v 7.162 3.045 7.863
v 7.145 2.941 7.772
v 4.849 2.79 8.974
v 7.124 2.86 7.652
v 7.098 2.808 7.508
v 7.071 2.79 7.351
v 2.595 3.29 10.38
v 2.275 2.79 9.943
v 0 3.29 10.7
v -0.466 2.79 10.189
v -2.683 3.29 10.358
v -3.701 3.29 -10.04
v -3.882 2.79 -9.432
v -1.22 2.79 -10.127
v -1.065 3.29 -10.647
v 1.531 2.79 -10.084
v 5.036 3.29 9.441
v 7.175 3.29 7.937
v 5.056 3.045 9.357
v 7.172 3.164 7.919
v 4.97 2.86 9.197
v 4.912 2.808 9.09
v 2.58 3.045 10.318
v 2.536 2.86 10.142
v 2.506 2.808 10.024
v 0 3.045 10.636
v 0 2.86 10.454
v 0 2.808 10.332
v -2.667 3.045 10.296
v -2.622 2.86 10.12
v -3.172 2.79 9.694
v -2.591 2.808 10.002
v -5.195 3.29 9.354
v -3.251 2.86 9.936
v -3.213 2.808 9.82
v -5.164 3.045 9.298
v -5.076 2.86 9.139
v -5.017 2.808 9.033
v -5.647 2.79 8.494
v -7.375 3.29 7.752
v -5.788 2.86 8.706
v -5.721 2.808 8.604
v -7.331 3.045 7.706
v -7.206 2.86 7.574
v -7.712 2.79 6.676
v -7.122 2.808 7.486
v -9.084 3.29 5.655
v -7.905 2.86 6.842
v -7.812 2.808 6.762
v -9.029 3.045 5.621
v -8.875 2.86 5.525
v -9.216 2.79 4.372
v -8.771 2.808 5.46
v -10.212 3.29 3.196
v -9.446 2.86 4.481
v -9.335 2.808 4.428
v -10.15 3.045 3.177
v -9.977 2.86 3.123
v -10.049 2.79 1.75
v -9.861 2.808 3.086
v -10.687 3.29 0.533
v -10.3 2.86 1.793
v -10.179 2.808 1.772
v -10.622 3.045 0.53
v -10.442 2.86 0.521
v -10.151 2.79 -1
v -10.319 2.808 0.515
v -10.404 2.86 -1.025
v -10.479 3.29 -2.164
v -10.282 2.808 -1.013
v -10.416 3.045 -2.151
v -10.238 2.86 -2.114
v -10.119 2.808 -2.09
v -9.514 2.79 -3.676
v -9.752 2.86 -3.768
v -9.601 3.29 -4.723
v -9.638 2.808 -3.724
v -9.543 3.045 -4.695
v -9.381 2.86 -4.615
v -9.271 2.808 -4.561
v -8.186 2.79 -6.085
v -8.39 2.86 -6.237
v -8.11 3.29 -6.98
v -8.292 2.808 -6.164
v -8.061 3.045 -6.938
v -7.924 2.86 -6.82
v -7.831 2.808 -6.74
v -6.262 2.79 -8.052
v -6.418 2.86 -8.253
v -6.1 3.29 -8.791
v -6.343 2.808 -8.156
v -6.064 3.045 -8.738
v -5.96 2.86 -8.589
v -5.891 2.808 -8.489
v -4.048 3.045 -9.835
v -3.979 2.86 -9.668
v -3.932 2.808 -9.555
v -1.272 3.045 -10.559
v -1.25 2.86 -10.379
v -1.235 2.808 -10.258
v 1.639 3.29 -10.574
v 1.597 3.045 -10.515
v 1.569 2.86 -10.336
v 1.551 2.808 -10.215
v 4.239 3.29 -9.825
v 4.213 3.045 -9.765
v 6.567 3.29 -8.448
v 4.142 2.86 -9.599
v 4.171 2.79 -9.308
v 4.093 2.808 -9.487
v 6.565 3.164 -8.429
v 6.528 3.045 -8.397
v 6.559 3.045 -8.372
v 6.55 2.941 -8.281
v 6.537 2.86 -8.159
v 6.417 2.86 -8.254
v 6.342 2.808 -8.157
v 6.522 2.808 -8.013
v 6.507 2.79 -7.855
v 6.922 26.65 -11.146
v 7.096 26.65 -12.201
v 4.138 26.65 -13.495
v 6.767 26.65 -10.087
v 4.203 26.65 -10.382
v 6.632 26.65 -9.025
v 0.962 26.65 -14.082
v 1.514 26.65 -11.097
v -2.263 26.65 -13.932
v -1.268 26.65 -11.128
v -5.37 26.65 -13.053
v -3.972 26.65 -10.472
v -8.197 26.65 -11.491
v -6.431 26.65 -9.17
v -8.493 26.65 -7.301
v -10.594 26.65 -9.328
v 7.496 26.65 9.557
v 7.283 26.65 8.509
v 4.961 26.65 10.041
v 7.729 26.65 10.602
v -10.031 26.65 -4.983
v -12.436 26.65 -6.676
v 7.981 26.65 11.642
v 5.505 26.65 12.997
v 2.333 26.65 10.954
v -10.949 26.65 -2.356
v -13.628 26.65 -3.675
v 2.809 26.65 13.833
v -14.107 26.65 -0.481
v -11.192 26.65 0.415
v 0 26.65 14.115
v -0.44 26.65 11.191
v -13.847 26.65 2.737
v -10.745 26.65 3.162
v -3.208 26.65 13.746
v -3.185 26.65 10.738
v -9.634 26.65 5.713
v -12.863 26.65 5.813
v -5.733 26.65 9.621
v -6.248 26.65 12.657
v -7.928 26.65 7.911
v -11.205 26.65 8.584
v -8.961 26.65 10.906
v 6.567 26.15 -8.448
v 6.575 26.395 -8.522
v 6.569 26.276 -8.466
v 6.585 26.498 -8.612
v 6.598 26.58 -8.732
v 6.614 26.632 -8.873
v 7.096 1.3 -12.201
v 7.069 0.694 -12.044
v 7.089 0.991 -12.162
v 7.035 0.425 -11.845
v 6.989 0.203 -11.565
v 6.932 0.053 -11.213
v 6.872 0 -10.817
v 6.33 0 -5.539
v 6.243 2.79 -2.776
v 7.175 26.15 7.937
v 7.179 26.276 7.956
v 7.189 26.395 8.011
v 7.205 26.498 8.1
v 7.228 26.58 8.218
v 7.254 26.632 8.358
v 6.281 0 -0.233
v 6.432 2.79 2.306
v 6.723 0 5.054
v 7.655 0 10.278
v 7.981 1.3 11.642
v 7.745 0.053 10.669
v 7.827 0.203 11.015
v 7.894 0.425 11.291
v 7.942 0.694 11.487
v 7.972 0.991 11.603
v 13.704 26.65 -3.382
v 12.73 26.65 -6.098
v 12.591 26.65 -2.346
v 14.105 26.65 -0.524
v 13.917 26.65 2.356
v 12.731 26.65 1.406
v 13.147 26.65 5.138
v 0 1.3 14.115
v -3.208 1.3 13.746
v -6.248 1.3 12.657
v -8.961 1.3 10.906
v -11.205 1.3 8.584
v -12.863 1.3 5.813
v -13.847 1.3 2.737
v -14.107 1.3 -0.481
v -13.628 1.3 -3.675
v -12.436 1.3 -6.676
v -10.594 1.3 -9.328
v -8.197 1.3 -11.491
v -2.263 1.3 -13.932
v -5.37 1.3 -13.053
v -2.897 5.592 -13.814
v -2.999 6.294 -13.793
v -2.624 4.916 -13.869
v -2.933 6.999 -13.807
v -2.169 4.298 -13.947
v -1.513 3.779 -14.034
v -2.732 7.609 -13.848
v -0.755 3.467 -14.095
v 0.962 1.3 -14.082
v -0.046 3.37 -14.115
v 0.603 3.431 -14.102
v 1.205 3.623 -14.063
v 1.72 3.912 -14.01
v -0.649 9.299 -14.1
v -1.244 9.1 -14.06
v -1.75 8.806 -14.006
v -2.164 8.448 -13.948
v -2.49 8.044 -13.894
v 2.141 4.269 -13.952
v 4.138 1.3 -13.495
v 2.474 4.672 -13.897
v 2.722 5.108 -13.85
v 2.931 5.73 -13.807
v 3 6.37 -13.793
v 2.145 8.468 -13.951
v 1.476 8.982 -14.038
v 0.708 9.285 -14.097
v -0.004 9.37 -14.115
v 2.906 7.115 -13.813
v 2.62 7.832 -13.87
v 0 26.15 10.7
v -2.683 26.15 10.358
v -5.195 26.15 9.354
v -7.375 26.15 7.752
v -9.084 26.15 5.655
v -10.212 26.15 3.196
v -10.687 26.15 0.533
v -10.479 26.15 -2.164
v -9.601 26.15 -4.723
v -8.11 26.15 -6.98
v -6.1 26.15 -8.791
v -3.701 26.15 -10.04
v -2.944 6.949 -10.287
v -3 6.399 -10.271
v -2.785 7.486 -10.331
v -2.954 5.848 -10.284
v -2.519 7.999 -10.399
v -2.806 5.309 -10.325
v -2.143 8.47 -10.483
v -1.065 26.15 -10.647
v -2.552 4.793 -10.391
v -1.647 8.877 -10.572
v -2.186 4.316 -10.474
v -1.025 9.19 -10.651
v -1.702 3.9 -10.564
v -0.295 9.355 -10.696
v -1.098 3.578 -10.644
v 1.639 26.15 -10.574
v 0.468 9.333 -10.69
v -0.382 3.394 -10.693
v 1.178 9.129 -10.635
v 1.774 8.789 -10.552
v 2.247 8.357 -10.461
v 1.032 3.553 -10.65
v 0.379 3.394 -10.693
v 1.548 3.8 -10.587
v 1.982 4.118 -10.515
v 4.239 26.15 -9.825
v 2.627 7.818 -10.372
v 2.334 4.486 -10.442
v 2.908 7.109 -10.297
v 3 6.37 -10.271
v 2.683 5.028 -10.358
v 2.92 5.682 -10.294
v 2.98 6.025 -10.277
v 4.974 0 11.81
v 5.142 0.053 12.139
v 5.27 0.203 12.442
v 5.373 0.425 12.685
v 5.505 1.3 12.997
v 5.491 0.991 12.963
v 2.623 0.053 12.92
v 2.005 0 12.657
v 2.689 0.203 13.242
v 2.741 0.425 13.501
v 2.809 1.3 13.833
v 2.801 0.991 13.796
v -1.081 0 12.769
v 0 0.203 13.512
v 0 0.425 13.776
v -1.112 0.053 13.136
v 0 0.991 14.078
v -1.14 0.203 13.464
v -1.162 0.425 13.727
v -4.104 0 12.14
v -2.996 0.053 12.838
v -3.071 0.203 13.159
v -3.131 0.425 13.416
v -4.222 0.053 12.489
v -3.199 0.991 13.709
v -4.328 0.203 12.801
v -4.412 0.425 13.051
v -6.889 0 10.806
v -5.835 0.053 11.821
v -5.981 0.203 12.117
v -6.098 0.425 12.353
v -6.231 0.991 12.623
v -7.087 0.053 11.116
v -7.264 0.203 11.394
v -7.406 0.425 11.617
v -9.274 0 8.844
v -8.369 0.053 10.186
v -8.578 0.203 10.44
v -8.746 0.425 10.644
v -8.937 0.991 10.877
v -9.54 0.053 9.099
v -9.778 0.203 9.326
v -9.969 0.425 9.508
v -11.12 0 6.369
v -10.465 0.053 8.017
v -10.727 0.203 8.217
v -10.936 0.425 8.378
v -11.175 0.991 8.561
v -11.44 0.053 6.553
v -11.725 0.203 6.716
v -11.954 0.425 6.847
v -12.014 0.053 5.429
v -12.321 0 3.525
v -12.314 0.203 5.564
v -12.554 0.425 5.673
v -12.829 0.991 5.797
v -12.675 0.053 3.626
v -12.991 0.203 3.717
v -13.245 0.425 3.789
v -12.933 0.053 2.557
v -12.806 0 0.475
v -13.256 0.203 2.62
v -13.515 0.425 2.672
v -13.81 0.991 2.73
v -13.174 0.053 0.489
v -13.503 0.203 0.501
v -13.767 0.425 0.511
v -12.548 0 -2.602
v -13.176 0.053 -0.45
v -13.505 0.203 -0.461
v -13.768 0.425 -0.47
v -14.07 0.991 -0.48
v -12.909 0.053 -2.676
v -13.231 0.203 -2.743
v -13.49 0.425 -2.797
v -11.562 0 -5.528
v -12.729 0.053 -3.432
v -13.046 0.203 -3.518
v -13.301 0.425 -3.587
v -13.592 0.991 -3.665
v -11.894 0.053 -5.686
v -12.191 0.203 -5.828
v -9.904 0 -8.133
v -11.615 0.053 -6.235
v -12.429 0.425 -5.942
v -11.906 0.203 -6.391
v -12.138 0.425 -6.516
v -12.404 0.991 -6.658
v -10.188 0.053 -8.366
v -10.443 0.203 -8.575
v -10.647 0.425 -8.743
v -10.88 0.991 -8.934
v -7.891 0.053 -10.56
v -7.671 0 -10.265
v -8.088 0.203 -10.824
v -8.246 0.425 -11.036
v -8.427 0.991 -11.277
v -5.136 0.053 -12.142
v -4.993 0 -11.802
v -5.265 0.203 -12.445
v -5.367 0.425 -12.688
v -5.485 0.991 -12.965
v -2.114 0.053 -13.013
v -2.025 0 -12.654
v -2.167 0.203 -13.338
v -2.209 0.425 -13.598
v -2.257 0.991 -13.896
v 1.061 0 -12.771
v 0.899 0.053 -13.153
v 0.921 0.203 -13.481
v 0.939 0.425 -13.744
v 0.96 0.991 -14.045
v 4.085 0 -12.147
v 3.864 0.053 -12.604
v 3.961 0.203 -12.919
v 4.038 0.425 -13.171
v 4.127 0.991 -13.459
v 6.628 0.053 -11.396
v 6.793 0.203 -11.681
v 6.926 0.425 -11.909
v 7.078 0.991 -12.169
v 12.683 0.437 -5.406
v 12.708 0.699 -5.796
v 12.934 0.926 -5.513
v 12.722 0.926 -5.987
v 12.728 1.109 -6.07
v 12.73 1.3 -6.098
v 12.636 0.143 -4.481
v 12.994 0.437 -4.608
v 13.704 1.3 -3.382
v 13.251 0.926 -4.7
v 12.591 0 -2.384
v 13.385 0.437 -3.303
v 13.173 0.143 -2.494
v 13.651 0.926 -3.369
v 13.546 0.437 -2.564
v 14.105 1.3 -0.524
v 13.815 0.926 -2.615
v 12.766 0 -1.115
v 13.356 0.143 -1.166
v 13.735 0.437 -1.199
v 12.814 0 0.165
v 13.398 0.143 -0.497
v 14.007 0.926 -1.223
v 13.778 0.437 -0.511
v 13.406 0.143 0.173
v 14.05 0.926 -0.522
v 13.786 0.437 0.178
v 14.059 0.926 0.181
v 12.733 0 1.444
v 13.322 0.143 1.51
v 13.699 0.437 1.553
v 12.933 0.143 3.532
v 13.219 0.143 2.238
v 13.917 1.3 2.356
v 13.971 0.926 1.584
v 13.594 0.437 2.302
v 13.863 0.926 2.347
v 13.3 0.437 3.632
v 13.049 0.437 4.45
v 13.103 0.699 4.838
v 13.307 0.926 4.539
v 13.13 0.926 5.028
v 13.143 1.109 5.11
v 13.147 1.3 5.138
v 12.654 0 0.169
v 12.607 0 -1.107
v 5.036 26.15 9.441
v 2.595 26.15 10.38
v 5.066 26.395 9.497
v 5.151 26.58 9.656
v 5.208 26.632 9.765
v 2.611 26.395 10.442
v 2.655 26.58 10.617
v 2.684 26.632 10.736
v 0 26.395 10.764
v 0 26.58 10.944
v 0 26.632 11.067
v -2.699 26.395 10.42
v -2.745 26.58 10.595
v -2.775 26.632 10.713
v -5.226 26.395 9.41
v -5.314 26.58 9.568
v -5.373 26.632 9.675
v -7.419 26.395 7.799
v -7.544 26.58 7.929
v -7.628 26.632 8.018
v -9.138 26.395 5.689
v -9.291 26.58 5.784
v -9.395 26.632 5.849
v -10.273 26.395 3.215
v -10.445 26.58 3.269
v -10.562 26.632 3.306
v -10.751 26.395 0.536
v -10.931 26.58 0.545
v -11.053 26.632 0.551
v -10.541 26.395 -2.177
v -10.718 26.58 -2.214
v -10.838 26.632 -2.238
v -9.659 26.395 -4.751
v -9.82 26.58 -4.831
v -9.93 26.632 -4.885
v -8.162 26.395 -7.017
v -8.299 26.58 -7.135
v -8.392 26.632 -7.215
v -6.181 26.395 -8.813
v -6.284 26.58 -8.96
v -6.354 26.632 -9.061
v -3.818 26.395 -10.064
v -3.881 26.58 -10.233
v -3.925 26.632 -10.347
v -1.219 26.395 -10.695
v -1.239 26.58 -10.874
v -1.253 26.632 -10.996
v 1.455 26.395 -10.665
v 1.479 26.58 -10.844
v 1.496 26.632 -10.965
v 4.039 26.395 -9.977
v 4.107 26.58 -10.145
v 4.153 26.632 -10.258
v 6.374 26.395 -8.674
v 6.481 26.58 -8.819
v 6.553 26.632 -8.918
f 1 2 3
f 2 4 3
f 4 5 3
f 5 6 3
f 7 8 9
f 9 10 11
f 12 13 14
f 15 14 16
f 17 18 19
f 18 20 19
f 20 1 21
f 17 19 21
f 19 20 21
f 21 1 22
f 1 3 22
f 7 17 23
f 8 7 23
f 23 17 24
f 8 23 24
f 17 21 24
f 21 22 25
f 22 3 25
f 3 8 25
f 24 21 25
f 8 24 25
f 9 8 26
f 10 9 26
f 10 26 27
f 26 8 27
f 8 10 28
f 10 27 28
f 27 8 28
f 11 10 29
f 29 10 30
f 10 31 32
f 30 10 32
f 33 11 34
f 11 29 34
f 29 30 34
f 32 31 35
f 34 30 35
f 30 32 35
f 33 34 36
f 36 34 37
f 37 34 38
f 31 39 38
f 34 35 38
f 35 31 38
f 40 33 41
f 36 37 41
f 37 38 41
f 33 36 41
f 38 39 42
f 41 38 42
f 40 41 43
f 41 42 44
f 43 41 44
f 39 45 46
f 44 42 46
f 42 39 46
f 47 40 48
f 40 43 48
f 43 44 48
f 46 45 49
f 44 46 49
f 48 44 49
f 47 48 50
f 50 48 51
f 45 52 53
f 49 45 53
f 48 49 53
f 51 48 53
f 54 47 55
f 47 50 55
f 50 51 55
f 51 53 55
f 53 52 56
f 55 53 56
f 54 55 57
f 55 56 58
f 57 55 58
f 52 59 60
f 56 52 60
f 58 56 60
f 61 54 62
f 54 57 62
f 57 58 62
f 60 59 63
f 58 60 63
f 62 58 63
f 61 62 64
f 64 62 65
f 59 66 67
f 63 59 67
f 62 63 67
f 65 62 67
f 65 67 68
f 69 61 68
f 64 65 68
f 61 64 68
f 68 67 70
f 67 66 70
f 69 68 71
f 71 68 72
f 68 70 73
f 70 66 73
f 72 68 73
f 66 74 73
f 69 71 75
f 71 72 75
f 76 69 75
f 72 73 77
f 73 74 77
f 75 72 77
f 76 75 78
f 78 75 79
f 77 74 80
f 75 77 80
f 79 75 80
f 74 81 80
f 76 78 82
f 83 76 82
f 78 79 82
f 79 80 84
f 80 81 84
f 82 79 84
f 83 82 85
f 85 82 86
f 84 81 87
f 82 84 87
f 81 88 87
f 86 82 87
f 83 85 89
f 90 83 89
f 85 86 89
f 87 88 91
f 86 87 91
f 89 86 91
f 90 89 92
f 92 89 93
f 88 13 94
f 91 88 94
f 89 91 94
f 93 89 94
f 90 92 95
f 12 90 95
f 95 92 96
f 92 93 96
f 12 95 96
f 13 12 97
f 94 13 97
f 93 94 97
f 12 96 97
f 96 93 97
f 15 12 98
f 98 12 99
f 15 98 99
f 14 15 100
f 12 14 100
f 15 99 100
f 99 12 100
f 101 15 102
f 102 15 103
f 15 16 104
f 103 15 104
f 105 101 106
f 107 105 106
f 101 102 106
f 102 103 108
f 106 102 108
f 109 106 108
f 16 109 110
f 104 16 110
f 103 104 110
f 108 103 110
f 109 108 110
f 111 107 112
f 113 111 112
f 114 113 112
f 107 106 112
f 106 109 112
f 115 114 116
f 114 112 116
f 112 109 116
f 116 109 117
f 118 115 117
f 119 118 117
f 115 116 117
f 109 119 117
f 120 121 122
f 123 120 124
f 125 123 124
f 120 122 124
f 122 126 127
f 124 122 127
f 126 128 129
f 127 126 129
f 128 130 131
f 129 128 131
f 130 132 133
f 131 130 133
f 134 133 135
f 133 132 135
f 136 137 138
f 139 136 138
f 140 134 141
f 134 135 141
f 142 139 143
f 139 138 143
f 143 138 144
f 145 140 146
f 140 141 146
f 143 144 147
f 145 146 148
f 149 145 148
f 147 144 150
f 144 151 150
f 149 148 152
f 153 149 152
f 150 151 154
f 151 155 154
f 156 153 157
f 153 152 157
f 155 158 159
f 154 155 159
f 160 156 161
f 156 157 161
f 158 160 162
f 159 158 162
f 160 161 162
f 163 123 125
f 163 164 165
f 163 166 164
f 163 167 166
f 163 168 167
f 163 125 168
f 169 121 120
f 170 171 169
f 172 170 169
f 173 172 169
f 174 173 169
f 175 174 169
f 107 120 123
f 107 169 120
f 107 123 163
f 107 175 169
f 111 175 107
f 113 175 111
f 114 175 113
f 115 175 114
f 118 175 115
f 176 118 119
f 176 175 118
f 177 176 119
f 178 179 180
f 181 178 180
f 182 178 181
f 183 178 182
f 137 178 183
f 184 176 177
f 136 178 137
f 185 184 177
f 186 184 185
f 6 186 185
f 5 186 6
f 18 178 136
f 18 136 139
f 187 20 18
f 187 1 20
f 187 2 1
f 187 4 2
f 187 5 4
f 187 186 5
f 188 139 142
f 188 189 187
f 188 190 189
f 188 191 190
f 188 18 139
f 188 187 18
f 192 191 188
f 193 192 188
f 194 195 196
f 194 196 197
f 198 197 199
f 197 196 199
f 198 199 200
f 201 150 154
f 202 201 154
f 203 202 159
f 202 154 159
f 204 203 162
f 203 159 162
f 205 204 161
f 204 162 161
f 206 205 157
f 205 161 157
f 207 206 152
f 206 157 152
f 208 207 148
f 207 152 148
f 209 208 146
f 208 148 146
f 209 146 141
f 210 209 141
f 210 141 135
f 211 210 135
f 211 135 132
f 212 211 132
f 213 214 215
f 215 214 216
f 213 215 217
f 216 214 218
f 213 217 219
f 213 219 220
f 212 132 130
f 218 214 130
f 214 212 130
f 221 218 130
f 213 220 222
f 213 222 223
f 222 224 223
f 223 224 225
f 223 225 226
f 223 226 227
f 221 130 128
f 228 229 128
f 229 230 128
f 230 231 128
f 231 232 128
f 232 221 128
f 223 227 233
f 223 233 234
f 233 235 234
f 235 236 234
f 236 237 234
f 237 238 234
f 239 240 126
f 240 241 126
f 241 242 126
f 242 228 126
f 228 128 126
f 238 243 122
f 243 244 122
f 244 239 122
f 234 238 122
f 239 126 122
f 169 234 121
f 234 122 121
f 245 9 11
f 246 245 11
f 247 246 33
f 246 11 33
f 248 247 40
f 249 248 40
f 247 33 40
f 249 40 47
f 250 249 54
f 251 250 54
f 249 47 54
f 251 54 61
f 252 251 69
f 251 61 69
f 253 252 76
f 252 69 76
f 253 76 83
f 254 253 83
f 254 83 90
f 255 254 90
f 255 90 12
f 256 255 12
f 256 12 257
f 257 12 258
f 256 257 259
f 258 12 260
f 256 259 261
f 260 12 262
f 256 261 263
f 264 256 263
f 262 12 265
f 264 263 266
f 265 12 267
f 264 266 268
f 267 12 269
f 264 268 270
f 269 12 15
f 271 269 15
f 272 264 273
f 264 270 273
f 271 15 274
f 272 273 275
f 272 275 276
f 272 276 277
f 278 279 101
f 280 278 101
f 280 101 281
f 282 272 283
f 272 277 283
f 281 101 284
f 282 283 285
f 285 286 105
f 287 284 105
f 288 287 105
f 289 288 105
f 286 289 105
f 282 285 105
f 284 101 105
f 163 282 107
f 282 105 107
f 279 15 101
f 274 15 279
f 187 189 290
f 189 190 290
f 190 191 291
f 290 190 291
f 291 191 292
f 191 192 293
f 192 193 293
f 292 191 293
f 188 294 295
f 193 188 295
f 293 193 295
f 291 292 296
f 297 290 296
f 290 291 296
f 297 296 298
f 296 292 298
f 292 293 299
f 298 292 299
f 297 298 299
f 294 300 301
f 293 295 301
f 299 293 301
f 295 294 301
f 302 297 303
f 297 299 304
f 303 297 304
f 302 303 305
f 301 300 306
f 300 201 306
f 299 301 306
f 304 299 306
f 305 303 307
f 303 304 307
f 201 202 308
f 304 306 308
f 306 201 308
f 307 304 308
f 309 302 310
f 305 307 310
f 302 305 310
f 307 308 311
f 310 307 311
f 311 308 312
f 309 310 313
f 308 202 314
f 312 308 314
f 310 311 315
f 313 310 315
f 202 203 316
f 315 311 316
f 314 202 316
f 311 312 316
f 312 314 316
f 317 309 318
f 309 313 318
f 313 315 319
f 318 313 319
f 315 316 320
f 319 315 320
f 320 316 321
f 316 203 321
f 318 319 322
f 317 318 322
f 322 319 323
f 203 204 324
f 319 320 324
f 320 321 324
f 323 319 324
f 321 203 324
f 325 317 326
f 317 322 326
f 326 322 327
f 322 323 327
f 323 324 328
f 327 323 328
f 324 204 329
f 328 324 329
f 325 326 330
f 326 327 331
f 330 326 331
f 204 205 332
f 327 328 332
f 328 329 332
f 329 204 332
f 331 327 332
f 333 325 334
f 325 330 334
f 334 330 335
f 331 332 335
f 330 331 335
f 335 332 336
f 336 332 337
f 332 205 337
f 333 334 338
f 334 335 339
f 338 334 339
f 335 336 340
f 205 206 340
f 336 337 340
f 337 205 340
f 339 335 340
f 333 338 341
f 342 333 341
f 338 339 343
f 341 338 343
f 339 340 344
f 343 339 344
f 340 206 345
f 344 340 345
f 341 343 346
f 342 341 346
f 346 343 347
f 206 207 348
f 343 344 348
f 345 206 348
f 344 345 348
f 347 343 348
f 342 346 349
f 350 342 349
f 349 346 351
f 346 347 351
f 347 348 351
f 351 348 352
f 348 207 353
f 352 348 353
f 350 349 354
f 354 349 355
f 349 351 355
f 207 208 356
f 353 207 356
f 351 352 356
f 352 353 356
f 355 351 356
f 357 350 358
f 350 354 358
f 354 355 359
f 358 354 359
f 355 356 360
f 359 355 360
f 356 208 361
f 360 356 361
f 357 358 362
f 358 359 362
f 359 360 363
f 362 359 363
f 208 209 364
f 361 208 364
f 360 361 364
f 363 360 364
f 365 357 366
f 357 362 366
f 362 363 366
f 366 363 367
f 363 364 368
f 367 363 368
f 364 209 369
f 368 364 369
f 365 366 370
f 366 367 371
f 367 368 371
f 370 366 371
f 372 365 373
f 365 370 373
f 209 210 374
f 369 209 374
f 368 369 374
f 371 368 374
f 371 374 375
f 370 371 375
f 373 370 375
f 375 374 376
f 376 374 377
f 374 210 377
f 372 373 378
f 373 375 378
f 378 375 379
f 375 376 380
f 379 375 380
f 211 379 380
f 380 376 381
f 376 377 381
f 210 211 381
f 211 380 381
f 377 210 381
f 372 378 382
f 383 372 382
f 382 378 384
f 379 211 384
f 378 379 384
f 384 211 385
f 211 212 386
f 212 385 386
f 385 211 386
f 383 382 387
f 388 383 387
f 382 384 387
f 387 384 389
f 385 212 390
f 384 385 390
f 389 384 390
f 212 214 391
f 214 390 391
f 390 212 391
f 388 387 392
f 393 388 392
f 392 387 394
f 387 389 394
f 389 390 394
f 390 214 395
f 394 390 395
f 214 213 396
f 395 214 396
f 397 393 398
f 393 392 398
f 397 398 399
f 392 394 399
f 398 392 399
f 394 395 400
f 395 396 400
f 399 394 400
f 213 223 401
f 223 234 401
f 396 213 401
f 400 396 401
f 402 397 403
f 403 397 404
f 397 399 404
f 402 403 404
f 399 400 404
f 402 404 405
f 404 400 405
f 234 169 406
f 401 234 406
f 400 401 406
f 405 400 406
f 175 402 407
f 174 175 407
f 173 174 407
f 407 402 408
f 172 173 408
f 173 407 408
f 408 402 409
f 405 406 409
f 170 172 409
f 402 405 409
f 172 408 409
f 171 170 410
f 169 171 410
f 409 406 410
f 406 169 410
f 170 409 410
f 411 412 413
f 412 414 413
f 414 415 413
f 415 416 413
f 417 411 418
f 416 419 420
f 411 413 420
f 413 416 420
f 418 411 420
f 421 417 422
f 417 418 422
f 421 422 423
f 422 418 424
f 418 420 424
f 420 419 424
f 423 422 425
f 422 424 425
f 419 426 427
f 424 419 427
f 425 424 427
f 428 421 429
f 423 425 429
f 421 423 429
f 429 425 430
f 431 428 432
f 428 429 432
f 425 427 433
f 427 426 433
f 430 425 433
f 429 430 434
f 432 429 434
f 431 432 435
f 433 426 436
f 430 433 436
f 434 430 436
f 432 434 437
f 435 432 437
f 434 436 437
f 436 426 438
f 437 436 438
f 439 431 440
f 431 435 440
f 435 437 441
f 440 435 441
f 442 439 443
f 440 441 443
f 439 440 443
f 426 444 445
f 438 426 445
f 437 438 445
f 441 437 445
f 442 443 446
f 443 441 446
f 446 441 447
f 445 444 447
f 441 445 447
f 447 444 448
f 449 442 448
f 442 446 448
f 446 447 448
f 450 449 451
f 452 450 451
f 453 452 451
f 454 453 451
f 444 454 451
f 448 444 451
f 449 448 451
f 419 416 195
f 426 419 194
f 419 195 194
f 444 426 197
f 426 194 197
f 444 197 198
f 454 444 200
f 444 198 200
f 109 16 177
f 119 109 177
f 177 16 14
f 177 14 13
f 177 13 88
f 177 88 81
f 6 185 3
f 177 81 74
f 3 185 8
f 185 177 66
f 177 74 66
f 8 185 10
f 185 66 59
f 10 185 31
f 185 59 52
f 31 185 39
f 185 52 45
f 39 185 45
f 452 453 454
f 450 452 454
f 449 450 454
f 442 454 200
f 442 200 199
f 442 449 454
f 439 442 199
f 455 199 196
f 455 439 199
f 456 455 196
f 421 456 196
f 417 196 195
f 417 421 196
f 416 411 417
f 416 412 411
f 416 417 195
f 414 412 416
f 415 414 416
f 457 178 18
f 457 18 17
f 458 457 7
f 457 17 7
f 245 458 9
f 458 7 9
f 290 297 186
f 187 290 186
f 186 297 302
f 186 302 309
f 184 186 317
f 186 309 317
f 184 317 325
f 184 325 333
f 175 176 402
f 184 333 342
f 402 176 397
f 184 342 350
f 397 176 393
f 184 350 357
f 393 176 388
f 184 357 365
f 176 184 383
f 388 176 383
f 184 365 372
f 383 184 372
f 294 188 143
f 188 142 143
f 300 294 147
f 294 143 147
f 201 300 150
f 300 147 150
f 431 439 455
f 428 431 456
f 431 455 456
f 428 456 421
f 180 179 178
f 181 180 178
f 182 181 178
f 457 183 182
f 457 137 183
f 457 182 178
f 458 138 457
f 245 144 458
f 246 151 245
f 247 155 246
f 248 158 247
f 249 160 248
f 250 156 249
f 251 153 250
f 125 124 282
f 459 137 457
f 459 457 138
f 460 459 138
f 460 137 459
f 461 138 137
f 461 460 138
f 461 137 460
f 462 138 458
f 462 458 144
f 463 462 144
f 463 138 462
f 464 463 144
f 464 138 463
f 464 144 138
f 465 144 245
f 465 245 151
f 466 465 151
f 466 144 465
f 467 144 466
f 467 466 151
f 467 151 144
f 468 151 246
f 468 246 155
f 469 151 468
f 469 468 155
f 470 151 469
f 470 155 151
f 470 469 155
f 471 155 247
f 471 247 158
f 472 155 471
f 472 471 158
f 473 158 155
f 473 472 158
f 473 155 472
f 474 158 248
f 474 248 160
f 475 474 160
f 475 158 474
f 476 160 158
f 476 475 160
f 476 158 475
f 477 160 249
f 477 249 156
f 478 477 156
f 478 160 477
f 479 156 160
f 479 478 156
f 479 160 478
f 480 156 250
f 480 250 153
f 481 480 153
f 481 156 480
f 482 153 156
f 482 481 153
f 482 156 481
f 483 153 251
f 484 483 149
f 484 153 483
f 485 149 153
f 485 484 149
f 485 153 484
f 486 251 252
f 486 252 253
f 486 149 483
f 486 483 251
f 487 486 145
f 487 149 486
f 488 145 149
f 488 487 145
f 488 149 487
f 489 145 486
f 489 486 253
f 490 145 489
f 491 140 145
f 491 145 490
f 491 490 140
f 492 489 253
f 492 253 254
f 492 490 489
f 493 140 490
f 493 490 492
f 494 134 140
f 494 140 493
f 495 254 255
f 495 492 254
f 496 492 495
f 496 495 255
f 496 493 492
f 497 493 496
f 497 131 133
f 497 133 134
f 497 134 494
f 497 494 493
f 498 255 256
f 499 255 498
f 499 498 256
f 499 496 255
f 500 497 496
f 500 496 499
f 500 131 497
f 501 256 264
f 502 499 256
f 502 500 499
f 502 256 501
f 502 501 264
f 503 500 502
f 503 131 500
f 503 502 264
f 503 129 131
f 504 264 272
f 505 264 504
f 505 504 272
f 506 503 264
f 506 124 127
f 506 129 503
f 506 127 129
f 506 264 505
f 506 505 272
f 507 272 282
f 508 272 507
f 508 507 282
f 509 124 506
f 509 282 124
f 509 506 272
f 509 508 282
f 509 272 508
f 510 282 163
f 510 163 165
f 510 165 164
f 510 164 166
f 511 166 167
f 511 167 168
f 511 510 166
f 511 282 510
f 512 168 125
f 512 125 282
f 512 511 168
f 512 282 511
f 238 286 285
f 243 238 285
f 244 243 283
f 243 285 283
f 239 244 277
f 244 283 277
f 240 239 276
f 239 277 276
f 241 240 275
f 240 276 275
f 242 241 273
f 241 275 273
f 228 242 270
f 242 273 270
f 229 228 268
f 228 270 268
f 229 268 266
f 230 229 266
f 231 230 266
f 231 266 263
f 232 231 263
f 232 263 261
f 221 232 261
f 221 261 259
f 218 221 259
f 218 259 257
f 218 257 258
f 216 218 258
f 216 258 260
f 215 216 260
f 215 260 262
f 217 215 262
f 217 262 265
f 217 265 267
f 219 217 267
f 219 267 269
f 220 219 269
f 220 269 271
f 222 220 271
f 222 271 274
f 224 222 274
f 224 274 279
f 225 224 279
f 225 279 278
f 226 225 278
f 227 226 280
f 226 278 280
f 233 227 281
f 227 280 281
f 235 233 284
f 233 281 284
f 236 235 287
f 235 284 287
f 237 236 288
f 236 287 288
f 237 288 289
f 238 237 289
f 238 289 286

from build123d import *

# Parameters (mm, degrees)
FILLET1_R          = 1.3
SKETCH3_R          = 3
CUT_EXTRUDE1_DEPTH = 20
FILLET3_R          = 0.5
FILLET4_R          = 0.5
CAVITY1_DEPTH      = 26.65


# Read off the part's stored shape, not the designer's step: Cavity1
with BuildPart() as part:
    # Sketch2 → Revolve1 (revolve)
    with BuildSketch(Plane(origin=(0, 0, 0), x_dir=(0, 0, -1), z_dir=(1, 0, 0)), mode=Mode.PRIVATE) as revolve1_sk:
        Polygon((0, 0), (14.115, 0), (14.115, 26.65), (10.7, 26.65), (10.7, 2.79), (0, 2.79), align=None)
    revolve(revolve1_sk.sketch.rotate(Axis((0, 29.213224894, 0), (0, -1, 0)), 180), axis=Axis((0, 29.213224894, 0), (0, -1, 0)))

    # Fillet1
    fillet1_edges = [part.edges().sort_by_distance(p)[0] for p in [
        (0, 0, -14.115),
    ]]
    fillet(fillet1_edges, radius=FILLET1_R)

    # Sketch3 → Cut-Extrude1 (cut)
    with BuildSketch(Plane.XY):
        with Locations((0, 6.37)):
            Circle(SKETCH3_R)
    extrude(amount=-CUT_EXTRUDE1_DEPTH, mode=Mode.SUBTRACT)

    # Fillet3
    fillet3_edges = [part.edges().sort_by_distance(p)[0] for p in [
        (0, 2.79, -10.7),
    ]]
    fillet(fillet3_edges, radius=FILLET3_R)

    # Fillet4
    fillet4_edges = [part.edges().sort_by_distance(p)[0] for p in [
        (0, 26.65, -10.7),
    ]]
    fillet(fillet4_edges, radius=FILLET4_R)

    # Cavity1 outline → Cavity1 (cut)
    with BuildSketch(Plane(origin=(0, 0, 0), x_dir=(1, 0, 0), z_dir=(0, 1, 0))):
        with BuildLine():
            ThreePointArc((7.981344541, -11.641793862), (11.053202959, -8.778378515), (13.146668661, -5.137930335))
            ThreePointArc((13.146668661, -5.137930335), (12.626305345, 0.468655883), (12.729603647, 6.098398951))
            ThreePointArc((12.729603647, 6.098398951), (10.37200886, 9.573643883), (7.096314041, 12.201456963))
            ThreePointArc((7.096314041, 12.201456963), (6.280674733, 0.233130633), (7.981344541, -11.641793862))
        make_face()
    extrude(amount=CAVITY1_DEPTH, mode=Mode.SUBTRACT)


solid = part.part
